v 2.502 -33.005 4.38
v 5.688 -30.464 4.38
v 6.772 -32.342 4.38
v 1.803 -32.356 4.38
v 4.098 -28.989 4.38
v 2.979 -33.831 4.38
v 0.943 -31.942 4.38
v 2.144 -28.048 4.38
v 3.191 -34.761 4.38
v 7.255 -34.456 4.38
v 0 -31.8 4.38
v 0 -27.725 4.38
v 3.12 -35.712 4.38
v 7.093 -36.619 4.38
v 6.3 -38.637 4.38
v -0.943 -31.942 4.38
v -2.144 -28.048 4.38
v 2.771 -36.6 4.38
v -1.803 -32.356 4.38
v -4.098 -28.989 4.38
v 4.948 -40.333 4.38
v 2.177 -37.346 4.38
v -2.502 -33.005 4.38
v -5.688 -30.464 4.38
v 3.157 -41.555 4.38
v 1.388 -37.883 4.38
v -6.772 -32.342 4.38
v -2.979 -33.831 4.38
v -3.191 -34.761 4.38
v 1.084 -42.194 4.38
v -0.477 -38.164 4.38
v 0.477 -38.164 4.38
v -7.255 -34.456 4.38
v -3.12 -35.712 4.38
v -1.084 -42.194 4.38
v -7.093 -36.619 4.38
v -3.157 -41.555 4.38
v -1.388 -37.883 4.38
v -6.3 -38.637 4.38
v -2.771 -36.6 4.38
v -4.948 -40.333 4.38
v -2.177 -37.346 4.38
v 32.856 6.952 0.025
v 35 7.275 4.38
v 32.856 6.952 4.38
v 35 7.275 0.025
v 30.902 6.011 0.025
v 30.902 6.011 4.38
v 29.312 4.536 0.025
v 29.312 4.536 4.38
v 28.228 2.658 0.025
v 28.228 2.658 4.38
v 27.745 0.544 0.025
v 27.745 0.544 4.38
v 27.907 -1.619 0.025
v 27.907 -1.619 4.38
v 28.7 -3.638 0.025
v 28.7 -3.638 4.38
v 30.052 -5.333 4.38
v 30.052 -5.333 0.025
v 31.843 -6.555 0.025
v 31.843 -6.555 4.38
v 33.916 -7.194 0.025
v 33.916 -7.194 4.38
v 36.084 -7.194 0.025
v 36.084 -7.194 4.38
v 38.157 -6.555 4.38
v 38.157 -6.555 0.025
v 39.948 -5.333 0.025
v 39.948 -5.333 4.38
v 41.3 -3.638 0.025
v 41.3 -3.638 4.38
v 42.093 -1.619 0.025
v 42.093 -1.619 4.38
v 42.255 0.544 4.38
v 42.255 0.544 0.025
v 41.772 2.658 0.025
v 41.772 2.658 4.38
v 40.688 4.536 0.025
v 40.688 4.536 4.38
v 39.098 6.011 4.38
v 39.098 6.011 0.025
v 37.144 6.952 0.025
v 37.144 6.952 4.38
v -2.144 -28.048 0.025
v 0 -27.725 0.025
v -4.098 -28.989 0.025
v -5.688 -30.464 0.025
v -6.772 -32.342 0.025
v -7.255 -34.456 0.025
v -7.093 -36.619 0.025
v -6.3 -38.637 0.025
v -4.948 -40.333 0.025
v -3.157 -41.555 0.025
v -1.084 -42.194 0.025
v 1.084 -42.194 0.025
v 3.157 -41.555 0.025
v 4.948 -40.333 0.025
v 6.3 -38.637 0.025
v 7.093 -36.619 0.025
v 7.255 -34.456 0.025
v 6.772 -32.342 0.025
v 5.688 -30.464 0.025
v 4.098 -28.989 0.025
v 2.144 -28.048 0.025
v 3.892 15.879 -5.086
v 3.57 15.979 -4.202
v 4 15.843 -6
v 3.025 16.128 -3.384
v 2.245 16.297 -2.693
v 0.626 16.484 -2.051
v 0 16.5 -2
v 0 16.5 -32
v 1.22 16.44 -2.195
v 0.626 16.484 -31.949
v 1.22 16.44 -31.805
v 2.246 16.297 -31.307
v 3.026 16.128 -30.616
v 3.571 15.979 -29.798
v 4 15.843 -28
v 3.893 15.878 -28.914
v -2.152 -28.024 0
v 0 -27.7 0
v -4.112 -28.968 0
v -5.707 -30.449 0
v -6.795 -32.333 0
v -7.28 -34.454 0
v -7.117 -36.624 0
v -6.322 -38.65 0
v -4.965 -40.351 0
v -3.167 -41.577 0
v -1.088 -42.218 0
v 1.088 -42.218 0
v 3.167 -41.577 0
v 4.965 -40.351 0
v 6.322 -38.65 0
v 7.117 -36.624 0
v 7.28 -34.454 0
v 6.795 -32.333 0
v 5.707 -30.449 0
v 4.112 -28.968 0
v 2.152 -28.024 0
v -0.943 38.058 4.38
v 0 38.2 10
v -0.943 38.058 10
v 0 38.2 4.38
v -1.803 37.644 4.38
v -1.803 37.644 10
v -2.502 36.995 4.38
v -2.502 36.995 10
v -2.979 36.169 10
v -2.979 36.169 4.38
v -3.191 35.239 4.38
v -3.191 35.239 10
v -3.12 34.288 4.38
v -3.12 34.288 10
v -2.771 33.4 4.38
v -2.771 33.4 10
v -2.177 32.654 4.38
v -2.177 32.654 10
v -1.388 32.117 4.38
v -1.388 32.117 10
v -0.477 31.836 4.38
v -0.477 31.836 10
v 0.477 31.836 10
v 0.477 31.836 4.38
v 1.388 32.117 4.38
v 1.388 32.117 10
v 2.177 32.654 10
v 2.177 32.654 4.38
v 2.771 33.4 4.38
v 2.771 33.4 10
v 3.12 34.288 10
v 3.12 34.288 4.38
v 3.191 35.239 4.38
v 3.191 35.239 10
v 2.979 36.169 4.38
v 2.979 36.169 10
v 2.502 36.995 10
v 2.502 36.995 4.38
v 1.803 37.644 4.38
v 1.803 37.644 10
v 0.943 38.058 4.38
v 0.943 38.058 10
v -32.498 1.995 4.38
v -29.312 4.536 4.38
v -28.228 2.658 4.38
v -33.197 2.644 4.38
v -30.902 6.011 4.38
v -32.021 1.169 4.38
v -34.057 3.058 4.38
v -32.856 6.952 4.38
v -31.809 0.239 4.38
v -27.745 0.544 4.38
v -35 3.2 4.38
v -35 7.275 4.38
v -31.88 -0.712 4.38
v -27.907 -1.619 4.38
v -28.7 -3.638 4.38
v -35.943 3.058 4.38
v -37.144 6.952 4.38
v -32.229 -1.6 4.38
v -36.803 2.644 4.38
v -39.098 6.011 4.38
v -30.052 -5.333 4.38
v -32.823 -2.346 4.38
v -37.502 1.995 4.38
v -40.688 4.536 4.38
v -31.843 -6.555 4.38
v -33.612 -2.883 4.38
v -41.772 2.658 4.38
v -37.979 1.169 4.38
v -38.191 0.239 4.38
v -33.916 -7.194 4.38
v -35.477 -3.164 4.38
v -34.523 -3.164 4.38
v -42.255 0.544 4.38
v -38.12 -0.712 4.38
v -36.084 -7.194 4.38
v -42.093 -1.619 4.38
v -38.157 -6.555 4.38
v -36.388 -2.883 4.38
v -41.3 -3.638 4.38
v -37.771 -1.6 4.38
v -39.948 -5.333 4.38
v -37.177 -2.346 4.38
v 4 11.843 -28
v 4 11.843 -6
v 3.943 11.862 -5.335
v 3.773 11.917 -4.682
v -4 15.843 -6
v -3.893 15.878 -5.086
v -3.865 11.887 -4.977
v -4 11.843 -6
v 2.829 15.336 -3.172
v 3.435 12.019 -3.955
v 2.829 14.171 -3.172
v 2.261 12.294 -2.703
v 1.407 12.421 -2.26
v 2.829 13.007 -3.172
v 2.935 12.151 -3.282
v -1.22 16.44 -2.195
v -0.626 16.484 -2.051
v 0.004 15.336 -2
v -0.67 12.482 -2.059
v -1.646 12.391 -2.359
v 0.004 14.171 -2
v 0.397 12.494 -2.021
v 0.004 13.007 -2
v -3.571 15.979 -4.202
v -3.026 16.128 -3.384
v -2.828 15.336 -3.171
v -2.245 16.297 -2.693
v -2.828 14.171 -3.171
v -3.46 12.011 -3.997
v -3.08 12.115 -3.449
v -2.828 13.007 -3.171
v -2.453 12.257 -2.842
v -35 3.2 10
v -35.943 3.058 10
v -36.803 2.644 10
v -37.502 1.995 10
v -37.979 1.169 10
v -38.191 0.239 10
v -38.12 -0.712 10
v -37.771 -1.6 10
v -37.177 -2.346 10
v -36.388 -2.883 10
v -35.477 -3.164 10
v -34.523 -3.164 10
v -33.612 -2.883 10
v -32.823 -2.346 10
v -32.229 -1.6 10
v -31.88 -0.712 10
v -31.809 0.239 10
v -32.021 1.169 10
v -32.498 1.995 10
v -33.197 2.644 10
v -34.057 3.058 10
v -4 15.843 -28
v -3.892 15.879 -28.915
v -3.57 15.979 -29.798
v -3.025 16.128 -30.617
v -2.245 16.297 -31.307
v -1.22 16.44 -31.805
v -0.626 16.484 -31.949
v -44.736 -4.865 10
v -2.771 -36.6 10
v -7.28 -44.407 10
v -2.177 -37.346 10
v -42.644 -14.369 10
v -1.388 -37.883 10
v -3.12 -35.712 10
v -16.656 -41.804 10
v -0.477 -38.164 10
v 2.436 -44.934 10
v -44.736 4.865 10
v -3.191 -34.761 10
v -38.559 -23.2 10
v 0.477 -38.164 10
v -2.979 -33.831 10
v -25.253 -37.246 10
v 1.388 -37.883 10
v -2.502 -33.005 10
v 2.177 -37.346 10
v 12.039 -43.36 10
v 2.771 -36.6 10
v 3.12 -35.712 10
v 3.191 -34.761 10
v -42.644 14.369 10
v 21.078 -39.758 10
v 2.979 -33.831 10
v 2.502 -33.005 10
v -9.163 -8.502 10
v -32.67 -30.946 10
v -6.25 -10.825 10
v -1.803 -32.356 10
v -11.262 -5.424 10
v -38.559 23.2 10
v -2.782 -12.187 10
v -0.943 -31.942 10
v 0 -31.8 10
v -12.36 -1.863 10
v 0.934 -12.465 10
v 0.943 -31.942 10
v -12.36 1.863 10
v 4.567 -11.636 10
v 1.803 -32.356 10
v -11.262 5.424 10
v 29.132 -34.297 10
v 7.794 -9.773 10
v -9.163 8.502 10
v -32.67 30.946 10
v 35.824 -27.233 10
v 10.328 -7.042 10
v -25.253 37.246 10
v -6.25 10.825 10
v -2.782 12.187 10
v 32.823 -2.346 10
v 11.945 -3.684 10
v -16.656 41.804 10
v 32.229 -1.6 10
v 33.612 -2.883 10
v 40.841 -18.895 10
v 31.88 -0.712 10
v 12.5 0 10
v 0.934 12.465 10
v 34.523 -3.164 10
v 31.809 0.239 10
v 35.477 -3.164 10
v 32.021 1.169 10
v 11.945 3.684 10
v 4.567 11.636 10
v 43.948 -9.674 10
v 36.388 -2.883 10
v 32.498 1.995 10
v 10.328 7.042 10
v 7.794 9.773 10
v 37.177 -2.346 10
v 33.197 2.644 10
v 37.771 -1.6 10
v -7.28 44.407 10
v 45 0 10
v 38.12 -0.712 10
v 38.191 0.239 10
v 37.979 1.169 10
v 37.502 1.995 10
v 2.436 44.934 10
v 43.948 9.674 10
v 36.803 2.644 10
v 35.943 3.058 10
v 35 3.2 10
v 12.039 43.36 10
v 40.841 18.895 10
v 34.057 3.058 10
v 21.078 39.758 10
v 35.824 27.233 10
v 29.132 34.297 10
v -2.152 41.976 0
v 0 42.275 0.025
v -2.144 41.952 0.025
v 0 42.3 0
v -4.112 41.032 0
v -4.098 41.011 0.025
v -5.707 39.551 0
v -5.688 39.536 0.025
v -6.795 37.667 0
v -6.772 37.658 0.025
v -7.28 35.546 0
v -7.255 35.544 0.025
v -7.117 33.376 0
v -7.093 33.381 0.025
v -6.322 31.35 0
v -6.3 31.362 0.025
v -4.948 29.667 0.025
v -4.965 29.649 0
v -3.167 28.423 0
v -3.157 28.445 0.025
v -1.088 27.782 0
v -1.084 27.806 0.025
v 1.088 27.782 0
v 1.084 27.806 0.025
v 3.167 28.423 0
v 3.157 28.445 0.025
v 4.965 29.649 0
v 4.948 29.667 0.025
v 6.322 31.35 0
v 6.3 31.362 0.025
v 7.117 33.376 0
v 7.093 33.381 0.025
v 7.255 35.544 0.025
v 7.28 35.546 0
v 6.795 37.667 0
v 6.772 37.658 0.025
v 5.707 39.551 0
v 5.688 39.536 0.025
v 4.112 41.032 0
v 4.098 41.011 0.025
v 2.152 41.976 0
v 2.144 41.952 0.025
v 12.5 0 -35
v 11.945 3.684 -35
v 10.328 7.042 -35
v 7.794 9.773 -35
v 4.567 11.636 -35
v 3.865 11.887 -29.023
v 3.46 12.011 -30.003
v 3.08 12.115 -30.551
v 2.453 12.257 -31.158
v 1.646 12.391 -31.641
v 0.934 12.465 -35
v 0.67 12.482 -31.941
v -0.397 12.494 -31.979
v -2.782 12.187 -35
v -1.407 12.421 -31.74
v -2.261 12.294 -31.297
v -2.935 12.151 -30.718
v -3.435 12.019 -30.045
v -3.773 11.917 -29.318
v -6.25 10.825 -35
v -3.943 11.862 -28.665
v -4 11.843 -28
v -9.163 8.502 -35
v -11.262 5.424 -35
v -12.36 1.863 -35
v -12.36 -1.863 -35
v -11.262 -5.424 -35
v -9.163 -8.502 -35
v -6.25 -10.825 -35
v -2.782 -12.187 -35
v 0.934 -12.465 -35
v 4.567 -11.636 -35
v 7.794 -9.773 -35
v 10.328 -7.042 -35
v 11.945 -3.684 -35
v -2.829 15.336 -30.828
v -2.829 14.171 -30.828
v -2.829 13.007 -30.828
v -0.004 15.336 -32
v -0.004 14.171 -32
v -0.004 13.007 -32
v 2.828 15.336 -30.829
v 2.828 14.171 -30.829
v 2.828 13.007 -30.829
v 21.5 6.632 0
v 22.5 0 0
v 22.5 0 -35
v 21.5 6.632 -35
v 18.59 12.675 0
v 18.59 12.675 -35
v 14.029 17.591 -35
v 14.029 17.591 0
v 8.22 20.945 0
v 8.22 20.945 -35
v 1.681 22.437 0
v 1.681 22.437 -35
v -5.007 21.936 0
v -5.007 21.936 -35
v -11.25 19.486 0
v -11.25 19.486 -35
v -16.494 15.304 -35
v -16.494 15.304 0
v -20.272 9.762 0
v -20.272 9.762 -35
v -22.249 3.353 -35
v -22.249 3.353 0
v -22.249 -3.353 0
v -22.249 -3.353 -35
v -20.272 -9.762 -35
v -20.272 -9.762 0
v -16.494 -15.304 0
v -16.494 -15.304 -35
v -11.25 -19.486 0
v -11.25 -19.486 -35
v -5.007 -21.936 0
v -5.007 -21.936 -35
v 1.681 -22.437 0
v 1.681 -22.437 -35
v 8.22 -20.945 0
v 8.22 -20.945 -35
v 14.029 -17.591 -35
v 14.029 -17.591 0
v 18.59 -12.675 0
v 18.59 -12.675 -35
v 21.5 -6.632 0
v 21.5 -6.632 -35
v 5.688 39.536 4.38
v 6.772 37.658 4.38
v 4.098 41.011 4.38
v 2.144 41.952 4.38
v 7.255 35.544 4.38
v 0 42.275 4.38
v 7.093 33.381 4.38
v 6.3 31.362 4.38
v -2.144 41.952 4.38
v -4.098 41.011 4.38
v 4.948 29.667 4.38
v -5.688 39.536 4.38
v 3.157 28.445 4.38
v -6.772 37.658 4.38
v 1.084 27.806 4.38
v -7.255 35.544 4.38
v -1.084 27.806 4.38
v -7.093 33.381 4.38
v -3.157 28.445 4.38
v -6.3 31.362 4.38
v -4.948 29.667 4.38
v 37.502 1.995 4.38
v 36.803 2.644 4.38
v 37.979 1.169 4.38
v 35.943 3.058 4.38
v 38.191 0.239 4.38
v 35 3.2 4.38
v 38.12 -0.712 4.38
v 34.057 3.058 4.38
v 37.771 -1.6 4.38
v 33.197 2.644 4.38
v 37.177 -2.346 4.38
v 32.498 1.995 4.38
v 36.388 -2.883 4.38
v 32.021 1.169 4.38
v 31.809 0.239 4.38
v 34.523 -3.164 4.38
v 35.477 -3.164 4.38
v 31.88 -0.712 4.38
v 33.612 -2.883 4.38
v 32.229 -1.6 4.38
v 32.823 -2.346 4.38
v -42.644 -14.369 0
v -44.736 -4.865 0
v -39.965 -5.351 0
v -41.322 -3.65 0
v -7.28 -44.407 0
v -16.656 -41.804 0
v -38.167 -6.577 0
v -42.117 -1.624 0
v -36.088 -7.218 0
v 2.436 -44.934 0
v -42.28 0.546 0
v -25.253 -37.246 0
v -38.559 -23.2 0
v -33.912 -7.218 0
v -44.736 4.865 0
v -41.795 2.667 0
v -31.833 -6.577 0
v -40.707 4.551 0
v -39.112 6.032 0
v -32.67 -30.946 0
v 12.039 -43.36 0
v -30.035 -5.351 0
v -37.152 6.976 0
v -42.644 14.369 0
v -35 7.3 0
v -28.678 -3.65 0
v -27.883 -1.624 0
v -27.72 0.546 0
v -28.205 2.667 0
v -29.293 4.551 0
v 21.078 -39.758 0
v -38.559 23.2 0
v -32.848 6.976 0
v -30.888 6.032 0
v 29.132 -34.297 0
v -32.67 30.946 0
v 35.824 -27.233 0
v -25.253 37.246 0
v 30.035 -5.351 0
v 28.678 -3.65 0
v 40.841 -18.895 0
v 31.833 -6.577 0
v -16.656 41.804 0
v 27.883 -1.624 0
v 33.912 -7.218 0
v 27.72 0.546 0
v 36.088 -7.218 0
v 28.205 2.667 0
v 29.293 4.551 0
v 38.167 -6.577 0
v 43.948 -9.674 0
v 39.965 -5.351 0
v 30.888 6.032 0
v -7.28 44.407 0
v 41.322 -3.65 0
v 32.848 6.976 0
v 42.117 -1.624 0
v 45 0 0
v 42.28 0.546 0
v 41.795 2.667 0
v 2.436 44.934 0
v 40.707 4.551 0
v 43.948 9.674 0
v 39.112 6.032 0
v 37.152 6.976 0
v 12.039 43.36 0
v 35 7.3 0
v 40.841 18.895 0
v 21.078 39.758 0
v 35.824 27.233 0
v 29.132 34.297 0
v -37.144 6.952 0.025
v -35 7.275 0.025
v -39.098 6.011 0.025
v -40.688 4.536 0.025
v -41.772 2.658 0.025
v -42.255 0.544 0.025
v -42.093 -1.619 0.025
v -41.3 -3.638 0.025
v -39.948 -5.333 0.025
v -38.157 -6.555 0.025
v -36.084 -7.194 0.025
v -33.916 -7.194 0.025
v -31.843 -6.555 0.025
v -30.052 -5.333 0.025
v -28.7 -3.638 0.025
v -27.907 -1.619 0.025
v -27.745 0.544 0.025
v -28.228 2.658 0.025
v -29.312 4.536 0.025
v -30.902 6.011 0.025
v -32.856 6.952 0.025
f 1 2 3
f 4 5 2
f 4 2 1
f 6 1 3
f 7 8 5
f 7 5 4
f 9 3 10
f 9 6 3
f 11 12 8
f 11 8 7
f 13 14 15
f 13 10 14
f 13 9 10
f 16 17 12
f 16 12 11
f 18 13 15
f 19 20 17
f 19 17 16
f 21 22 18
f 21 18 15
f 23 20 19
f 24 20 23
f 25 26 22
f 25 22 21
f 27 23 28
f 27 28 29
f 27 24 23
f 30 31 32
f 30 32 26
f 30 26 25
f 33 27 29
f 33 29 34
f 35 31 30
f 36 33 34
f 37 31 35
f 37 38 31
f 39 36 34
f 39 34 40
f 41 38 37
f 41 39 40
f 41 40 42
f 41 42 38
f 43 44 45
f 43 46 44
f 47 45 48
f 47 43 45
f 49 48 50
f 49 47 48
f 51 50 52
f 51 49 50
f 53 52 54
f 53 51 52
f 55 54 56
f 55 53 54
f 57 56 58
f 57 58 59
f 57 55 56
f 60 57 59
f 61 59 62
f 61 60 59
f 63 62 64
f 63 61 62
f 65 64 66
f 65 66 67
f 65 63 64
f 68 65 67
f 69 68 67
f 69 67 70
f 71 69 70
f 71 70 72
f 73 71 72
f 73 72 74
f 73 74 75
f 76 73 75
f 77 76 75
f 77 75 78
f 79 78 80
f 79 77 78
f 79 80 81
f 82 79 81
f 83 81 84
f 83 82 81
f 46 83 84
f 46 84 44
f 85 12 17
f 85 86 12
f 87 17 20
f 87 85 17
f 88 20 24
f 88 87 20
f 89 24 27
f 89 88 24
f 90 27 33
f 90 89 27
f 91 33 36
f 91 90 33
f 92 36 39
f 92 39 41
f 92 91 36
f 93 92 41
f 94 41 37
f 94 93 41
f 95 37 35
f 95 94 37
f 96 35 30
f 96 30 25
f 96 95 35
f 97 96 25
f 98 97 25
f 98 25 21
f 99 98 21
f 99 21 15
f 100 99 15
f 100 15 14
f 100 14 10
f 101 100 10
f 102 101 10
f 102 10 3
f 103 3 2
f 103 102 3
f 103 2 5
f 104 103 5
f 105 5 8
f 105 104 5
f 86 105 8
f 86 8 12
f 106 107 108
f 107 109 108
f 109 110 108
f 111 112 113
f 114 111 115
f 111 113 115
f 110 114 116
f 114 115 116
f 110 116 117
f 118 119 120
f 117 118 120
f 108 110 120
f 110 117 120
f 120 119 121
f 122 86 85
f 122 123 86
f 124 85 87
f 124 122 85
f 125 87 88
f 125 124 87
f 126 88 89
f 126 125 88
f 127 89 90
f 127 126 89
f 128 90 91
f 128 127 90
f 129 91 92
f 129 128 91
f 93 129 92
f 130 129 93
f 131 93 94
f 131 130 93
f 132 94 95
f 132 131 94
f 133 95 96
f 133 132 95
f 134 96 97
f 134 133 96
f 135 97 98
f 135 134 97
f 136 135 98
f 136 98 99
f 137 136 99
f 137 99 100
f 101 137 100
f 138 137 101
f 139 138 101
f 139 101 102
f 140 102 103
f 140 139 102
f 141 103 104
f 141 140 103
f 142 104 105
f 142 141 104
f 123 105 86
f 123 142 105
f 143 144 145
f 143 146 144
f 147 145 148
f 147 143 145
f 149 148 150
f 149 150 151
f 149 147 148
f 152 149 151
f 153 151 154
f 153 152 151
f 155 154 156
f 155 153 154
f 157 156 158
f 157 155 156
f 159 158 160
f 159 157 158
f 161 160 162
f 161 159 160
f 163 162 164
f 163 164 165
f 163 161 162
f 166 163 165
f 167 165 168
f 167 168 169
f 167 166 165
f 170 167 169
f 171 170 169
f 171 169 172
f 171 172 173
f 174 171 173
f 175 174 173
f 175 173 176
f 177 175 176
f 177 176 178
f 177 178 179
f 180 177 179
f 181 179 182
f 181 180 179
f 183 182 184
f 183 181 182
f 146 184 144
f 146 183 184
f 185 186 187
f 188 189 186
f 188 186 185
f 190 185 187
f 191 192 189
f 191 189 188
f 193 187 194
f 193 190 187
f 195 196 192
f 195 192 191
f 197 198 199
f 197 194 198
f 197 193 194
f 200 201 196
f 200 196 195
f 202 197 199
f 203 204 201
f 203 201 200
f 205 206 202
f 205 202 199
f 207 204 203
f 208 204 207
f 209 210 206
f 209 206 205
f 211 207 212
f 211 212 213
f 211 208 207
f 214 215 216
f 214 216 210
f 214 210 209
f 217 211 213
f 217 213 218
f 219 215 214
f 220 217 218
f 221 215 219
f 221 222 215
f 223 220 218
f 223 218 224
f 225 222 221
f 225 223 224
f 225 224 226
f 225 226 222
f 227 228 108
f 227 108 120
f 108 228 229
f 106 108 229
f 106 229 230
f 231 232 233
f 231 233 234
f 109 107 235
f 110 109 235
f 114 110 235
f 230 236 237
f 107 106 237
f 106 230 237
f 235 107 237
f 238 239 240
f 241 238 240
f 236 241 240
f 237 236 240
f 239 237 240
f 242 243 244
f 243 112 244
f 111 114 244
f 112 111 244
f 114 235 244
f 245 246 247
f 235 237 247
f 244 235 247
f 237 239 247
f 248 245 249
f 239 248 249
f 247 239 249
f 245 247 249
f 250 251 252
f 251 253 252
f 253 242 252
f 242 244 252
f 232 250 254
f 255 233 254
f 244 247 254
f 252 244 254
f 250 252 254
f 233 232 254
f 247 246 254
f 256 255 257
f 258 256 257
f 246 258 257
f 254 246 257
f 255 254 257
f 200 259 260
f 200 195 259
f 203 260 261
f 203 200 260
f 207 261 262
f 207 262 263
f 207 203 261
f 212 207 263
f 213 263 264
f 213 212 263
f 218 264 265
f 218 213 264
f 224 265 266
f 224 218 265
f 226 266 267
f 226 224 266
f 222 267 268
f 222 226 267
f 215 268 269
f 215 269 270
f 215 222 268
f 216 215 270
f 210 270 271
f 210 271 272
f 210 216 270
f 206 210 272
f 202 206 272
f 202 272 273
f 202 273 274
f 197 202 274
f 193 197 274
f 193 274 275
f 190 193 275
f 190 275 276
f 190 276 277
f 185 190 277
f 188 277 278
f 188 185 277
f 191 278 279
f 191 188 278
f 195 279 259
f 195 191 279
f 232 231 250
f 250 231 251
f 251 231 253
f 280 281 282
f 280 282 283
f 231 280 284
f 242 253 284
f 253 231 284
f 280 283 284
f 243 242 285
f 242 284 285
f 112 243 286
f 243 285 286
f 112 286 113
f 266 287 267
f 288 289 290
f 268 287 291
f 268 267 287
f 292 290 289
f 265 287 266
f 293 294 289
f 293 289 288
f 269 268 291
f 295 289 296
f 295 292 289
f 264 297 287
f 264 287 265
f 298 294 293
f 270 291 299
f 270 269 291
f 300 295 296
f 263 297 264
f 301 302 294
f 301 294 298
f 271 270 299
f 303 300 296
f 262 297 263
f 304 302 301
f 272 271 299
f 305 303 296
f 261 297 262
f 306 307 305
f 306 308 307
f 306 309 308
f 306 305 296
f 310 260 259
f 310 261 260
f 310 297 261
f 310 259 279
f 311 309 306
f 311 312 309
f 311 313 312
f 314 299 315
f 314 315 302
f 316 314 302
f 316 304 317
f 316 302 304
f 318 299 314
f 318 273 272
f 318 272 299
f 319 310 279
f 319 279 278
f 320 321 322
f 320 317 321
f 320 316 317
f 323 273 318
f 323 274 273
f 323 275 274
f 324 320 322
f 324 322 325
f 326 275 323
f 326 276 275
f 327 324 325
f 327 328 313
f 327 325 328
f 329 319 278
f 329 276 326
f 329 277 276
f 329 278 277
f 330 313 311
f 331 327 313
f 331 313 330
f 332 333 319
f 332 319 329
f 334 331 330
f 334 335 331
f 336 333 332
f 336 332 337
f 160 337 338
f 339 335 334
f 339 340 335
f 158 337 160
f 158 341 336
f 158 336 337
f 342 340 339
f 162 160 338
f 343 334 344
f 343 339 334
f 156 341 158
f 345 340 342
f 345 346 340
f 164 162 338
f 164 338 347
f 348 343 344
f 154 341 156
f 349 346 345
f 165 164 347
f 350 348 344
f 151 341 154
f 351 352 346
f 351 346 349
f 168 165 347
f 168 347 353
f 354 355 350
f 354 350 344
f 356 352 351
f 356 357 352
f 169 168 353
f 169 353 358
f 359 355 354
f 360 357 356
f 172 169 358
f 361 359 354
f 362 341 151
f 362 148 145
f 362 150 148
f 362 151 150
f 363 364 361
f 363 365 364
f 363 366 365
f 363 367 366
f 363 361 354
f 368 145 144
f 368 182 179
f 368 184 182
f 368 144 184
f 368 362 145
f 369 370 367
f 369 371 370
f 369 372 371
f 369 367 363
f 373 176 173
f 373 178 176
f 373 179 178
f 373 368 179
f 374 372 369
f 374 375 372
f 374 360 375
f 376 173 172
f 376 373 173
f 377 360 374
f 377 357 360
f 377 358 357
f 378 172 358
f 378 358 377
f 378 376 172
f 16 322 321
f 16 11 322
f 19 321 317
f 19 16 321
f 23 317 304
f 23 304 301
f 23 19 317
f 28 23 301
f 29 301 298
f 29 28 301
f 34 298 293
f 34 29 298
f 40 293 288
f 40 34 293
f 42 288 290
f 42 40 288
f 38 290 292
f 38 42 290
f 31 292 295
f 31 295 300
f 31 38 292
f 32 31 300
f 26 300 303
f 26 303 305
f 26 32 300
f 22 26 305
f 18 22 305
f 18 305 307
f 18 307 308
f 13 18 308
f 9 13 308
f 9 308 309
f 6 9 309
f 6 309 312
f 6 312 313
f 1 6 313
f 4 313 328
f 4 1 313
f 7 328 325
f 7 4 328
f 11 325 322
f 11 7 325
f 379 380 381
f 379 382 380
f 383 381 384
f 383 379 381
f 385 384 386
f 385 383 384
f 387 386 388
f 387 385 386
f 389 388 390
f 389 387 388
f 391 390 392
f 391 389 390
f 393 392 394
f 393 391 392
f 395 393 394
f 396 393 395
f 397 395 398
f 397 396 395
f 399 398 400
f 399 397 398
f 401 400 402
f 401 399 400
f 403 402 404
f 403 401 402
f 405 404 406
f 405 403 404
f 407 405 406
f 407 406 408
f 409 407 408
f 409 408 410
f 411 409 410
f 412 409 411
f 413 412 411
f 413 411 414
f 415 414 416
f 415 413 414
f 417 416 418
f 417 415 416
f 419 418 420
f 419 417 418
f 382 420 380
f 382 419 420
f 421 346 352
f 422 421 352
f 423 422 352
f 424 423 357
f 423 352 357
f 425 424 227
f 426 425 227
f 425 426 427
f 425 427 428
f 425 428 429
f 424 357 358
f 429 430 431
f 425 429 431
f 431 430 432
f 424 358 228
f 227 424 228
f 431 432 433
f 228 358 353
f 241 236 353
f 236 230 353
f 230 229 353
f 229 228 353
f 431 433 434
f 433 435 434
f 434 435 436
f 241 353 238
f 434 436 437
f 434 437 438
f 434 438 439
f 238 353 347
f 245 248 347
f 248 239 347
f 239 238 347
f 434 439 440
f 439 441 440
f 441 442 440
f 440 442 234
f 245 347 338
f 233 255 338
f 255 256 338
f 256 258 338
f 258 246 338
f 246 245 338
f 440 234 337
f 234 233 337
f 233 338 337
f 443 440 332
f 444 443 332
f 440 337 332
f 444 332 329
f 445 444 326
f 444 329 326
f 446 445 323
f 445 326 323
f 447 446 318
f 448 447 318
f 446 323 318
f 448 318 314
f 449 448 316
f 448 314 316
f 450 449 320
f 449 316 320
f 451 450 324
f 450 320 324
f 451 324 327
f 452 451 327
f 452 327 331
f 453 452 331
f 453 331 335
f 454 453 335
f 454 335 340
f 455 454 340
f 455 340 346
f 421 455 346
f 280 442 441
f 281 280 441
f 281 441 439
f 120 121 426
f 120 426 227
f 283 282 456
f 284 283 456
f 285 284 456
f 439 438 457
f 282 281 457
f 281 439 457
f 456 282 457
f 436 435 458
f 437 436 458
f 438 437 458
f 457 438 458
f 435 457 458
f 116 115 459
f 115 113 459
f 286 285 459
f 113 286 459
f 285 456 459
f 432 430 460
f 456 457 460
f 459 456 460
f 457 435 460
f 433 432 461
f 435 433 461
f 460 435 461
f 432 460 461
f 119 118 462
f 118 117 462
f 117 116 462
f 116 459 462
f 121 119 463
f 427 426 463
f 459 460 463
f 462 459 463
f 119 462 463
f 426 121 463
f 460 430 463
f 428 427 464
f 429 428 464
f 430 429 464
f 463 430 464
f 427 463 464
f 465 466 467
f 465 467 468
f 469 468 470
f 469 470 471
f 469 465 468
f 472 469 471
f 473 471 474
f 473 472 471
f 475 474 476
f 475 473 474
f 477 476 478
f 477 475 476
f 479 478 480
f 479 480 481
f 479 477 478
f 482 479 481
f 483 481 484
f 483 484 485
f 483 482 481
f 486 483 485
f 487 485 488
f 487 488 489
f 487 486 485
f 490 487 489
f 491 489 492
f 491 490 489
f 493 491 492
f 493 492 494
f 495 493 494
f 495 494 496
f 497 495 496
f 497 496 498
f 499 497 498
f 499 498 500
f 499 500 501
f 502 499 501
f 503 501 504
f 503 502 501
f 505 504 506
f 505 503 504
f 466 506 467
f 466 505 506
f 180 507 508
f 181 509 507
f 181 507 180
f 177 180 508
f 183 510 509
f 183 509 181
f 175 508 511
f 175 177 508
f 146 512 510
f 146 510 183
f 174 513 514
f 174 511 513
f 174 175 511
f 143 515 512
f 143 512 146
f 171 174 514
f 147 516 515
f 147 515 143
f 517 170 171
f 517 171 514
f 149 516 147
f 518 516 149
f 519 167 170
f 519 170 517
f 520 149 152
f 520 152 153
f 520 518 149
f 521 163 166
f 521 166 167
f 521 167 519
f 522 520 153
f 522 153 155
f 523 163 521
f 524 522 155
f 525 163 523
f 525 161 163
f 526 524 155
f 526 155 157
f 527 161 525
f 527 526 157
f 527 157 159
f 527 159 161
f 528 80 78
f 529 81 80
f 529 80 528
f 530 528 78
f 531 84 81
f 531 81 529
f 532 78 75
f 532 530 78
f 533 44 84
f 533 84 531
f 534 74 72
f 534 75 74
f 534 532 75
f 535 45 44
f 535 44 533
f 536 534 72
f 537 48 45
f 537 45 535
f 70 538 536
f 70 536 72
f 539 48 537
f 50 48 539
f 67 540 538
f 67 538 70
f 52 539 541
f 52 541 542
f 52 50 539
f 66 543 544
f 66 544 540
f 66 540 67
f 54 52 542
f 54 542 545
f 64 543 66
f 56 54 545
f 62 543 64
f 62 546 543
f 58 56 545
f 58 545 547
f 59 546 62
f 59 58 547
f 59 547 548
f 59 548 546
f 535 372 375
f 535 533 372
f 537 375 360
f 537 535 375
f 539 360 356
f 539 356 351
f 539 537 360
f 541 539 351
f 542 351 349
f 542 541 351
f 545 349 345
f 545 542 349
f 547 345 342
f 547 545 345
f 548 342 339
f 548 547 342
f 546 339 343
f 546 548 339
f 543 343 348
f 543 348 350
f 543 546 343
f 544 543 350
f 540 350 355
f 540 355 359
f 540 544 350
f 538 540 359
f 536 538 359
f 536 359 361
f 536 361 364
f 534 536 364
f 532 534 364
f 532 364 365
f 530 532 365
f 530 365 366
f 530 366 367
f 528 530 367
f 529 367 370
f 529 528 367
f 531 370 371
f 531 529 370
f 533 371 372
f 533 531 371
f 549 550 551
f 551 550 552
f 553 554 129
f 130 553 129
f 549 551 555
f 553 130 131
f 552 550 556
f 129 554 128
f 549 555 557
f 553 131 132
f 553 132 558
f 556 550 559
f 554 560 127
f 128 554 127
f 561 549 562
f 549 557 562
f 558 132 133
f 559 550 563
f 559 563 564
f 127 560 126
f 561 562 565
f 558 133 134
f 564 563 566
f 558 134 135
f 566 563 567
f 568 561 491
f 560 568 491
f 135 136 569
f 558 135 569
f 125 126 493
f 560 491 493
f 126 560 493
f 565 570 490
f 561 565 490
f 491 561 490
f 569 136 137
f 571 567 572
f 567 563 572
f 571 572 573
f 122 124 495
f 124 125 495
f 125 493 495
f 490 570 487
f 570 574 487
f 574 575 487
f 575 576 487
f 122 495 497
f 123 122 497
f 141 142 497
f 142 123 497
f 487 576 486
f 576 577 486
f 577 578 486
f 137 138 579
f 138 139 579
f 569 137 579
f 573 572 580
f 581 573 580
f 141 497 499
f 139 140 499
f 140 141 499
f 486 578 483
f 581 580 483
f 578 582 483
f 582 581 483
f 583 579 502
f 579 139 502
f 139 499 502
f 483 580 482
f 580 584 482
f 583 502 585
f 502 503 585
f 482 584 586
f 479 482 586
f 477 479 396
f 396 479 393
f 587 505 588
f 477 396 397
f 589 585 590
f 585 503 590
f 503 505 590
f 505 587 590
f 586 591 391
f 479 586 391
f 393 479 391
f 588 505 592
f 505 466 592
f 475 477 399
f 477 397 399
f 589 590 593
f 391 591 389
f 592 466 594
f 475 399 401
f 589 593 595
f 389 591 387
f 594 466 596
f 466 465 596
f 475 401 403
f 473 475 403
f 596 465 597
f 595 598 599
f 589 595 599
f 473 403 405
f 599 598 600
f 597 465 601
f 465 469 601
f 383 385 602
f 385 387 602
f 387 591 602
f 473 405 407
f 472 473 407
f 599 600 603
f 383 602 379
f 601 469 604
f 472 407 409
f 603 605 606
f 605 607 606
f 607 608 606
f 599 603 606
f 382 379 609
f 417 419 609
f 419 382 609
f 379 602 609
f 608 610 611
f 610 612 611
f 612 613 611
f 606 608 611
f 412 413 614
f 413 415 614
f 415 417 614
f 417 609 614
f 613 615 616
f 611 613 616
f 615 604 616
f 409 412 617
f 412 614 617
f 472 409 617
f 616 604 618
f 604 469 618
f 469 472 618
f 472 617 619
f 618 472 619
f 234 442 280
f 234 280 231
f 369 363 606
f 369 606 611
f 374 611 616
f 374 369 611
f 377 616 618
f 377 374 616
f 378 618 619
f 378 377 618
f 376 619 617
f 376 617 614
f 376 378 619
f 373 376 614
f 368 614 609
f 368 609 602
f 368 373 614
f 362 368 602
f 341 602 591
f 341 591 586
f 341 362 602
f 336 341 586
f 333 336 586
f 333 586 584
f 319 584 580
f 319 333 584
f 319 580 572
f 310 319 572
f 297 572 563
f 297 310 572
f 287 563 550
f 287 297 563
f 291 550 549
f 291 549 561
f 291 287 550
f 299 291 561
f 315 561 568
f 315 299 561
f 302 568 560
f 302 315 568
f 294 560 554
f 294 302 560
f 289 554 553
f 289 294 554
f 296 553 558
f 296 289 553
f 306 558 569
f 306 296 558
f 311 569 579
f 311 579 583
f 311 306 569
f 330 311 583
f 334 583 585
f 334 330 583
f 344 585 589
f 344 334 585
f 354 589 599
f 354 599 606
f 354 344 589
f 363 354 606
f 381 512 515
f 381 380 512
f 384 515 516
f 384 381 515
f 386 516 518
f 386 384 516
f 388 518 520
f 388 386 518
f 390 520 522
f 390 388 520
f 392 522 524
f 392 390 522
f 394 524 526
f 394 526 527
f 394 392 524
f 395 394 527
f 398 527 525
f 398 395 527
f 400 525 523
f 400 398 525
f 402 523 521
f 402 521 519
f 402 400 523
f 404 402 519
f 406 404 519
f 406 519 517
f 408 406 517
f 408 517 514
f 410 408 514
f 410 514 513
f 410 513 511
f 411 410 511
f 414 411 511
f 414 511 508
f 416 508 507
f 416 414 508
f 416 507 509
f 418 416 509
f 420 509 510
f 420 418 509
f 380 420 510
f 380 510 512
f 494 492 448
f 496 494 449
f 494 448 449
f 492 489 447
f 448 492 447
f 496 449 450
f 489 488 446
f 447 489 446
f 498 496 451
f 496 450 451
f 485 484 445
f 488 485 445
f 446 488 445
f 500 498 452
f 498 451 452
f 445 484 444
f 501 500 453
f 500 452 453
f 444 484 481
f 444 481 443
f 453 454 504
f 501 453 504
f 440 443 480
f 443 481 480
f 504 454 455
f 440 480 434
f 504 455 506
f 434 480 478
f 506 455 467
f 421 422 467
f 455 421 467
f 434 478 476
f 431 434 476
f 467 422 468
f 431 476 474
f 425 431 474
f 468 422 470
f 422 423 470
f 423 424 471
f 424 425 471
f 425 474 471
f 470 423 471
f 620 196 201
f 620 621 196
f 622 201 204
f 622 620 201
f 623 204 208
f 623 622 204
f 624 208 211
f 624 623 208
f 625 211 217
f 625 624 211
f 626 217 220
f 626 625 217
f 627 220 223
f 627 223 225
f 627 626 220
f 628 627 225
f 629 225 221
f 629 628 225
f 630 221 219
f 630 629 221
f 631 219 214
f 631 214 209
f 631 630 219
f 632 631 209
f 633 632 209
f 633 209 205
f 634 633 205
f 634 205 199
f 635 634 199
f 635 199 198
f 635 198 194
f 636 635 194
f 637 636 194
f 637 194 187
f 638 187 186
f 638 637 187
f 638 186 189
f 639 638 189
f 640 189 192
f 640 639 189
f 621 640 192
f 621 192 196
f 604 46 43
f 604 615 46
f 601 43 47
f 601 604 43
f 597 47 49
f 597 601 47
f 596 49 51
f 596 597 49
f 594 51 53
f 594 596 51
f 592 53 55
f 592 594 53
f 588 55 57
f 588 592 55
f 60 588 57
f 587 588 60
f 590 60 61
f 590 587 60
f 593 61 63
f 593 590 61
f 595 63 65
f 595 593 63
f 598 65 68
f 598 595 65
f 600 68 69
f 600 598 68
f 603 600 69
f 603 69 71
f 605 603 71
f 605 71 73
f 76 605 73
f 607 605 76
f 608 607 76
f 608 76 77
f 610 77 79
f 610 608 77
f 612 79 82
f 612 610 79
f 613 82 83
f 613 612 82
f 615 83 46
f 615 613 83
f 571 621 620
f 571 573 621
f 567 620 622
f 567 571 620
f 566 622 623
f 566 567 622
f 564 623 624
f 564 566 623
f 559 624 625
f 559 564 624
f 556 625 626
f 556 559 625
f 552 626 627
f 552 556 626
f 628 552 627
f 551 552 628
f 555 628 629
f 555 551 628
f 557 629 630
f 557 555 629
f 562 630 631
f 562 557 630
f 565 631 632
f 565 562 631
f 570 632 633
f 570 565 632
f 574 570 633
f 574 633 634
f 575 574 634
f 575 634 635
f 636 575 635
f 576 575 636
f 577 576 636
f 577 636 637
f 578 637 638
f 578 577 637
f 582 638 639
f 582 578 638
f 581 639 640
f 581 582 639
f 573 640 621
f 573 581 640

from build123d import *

# Parameters (mm, degrees)
SKETCH1_R                              = 22.5
SKETCH1_R_2                            = 12.5
BOSS_EXTRUDE1_DEPTH                    = 35
BOSS_EXTRUDE2_START                    = 10
SKETCH2_R                              = 45
SKETCH2_R_2                            = 12.5
BOSS_EXTRUDE2_DEPTH                    = 10
CUT_EXTRUDE1_START                     = 11
CUT_EXTRUDE1_DEPTH                     = 5.500000008
CUT_EXTRUDE1_START_2                   = -33
CUT_EXTRUDE1_2_DEPTH                   = 32
CBORE_FOR_M6_HEX_HEAD_BOLT1_AT_2_COUNT = 2
CBORE_FOR_M6_HEX_HEAD_BOLT1_AT_2_PITCH = 49.497474683
CBORE_FOR_M6_HEX_HEAD_BOLT1_AT_3_COUNT = 2
CBORE_FOR_M6_HEX_HEAD_BOLT1_AT_3_PITCH = 70
CBORE_FOR_M6_HEX_HEAD_BOLT1_AT_4_COUNT = 2
CBORE_FOR_M6_HEX_HEAD_BOLT1_AT_4_PITCH = 49.497474683


with BuildPart() as part:
    # Sketch1 → Boss-Extrude1 (new body)
    with BuildSketch(Plane.XY):
        Circle(SKETCH1_R)
        Circle(SKETCH1_R_2, mode=Mode.SUBTRACT)
    extrude(amount=-BOSS_EXTRUDE1_DEPTH)

    # Sketch2 → Boss-Extrude2 (add)
    with BuildSketch(Plane.XY.offset(BOSS_EXTRUDE2_START)):
        Circle(SKETCH2_R)
        Circle(SKETCH2_R_2, mode=Mode.SUBTRACT)
    extrude(amount=-BOSS_EXTRUDE2_DEPTH)

    # Cut-Extrude1: read off the stored shape, not the designer's step
    # Cut-Extrude1 outline → Cut-Extrude1 (cut)
    with BuildSketch(Plane(origin=(0, 0, 0), x_dir=(1, 0, 0), z_dir=(0, 1, 0)).offset(CUT_EXTRUDE1_START)):
        with BuildLine():
            add(Edge.make_bspline(
                [(-4, 28), (-4, 29.064380904), (-3.561099342, 30.095615587), (-2.096292766, 31.560700753), (-1.055346498, 31.998914356), (1.04710073, 32.001081394), (2.090364215, 31.566087585), (3.564946316, 30.092309962), (4, 29.064475319), (4, 28)],
                knots=[0, 0, 0, 0, 0.25, 0.25, 0.5, 0.5, 0.75, 0.75, 1, 1, 1, 1], degree=3))
            Line((-4, 28), (-4, 6))
            add(Edge.make_bspline(
                [(4, 6), (4, 4.935619096), (3.561099342, 3.904384413), (2.096292766, 2.439299247), (1.055346498, 2.001085644), (-1.04710073, 1.998918606), (-2.090364215, 2.433912415), (-3.564946316, 3.907690038), (-4, 4.935524681), (-4, 6)],
                knots=[0, 0, 0, 0, 0.25, 0.25, 0.5, 0.5, 0.75, 0.75, 1, 1, 1, 1], degree=3))
            Line((4, 6), (4, 28))
        make_face()
    extrude(amount=CUT_EXTRUDE1_DEPTH, mode=Mode.SUBTRACT)

    # Cut-Extrude1 2 outline → Cut-Extrude1 2 (add)
    with BuildSketch(Plane.XY.offset(CUT_EXTRUDE1_START_2)):
        with BuildLine():
            ThreePointArc((-4, 15.842719282), (-2.026821151, 16.334585361), (2.53e-07, 16.5))
            Line((2.53e-07, 16.5), (-4, 16.500000008))
            Line((-4, 16.500000008), (-4, 15.842719282))
        make_face()
        with BuildLine():
            ThreePointArc((2.53e-07, 16.5), (2.026821401, 16.33458532), (4, 15.842719282))
            Line((4, 15.842719282), (4, 16.500000008))
            Line((4, 16.500000008), (2.53e-07, 16.5))
        make_face()
    extrude(amount=CUT_EXTRUDE1_2_DEPTH)

    # Sketch5 → CBORE for M6 Hex Head Bolt1 (revolve, cut)
    with BuildSketch(Plane.YZ.offset(35)):
        Polygon((0, 0), (0, 10), (3.2, 10), (3.2, 4.38), (7.275, 4.38), (7.275, 0.025), (7.3, 0), align=None)
    cbore_for_m6_hex_head_bolt1 = revolve(axis=Axis((35, 0, -6.35), (0, 0, 1)), mode=Mode.SUBTRACT)

    # CBORE for M6 Hex Head Bolt1 at 2: CBORE for M6 Hex Head Bolt1 ×2
    with Locations(*[Vector(-0.7071067811865512, 0.7071067811865438, 0) * (i * CBORE_FOR_M6_HEX_HEAD_BOLT1_AT_2_PITCH) for i in range(1, CBORE_FOR_M6_HEX_HEAD_BOLT1_AT_2_COUNT)]):
        add(cbore_for_m6_hex_head_bolt1, mode=Mode.SUBTRACT)

    # CBORE for M6 Hex Head Bolt1 at 3: CBORE for M6 Hex Head Bolt1 ×2
    with Locations(*[(-i * CBORE_FOR_M6_HEX_HEAD_BOLT1_AT_3_PITCH, 0, 0) for i in range(1, CBORE_FOR_M6_HEX_HEAD_BOLT1_AT_3_COUNT)]):
        add(cbore_for_m6_hex_head_bolt1, mode=Mode.SUBTRACT)

    # CBORE for M6 Hex Head Bolt1 at 4: CBORE for M6 Hex Head Bolt1 ×2
    with Locations(*[Vector(-0.7071067811865414, -0.7071067811865538, 0) * (i * CBORE_FOR_M6_HEX_HEAD_BOLT1_AT_4_PITCH) for i in range(1, CBORE_FOR_M6_HEX_HEAD_BOLT1_AT_4_COUNT)]):
        add(cbore_for_m6_hex_head_bolt1, mode=Mode.SUBTRACT)


solid = part.part
